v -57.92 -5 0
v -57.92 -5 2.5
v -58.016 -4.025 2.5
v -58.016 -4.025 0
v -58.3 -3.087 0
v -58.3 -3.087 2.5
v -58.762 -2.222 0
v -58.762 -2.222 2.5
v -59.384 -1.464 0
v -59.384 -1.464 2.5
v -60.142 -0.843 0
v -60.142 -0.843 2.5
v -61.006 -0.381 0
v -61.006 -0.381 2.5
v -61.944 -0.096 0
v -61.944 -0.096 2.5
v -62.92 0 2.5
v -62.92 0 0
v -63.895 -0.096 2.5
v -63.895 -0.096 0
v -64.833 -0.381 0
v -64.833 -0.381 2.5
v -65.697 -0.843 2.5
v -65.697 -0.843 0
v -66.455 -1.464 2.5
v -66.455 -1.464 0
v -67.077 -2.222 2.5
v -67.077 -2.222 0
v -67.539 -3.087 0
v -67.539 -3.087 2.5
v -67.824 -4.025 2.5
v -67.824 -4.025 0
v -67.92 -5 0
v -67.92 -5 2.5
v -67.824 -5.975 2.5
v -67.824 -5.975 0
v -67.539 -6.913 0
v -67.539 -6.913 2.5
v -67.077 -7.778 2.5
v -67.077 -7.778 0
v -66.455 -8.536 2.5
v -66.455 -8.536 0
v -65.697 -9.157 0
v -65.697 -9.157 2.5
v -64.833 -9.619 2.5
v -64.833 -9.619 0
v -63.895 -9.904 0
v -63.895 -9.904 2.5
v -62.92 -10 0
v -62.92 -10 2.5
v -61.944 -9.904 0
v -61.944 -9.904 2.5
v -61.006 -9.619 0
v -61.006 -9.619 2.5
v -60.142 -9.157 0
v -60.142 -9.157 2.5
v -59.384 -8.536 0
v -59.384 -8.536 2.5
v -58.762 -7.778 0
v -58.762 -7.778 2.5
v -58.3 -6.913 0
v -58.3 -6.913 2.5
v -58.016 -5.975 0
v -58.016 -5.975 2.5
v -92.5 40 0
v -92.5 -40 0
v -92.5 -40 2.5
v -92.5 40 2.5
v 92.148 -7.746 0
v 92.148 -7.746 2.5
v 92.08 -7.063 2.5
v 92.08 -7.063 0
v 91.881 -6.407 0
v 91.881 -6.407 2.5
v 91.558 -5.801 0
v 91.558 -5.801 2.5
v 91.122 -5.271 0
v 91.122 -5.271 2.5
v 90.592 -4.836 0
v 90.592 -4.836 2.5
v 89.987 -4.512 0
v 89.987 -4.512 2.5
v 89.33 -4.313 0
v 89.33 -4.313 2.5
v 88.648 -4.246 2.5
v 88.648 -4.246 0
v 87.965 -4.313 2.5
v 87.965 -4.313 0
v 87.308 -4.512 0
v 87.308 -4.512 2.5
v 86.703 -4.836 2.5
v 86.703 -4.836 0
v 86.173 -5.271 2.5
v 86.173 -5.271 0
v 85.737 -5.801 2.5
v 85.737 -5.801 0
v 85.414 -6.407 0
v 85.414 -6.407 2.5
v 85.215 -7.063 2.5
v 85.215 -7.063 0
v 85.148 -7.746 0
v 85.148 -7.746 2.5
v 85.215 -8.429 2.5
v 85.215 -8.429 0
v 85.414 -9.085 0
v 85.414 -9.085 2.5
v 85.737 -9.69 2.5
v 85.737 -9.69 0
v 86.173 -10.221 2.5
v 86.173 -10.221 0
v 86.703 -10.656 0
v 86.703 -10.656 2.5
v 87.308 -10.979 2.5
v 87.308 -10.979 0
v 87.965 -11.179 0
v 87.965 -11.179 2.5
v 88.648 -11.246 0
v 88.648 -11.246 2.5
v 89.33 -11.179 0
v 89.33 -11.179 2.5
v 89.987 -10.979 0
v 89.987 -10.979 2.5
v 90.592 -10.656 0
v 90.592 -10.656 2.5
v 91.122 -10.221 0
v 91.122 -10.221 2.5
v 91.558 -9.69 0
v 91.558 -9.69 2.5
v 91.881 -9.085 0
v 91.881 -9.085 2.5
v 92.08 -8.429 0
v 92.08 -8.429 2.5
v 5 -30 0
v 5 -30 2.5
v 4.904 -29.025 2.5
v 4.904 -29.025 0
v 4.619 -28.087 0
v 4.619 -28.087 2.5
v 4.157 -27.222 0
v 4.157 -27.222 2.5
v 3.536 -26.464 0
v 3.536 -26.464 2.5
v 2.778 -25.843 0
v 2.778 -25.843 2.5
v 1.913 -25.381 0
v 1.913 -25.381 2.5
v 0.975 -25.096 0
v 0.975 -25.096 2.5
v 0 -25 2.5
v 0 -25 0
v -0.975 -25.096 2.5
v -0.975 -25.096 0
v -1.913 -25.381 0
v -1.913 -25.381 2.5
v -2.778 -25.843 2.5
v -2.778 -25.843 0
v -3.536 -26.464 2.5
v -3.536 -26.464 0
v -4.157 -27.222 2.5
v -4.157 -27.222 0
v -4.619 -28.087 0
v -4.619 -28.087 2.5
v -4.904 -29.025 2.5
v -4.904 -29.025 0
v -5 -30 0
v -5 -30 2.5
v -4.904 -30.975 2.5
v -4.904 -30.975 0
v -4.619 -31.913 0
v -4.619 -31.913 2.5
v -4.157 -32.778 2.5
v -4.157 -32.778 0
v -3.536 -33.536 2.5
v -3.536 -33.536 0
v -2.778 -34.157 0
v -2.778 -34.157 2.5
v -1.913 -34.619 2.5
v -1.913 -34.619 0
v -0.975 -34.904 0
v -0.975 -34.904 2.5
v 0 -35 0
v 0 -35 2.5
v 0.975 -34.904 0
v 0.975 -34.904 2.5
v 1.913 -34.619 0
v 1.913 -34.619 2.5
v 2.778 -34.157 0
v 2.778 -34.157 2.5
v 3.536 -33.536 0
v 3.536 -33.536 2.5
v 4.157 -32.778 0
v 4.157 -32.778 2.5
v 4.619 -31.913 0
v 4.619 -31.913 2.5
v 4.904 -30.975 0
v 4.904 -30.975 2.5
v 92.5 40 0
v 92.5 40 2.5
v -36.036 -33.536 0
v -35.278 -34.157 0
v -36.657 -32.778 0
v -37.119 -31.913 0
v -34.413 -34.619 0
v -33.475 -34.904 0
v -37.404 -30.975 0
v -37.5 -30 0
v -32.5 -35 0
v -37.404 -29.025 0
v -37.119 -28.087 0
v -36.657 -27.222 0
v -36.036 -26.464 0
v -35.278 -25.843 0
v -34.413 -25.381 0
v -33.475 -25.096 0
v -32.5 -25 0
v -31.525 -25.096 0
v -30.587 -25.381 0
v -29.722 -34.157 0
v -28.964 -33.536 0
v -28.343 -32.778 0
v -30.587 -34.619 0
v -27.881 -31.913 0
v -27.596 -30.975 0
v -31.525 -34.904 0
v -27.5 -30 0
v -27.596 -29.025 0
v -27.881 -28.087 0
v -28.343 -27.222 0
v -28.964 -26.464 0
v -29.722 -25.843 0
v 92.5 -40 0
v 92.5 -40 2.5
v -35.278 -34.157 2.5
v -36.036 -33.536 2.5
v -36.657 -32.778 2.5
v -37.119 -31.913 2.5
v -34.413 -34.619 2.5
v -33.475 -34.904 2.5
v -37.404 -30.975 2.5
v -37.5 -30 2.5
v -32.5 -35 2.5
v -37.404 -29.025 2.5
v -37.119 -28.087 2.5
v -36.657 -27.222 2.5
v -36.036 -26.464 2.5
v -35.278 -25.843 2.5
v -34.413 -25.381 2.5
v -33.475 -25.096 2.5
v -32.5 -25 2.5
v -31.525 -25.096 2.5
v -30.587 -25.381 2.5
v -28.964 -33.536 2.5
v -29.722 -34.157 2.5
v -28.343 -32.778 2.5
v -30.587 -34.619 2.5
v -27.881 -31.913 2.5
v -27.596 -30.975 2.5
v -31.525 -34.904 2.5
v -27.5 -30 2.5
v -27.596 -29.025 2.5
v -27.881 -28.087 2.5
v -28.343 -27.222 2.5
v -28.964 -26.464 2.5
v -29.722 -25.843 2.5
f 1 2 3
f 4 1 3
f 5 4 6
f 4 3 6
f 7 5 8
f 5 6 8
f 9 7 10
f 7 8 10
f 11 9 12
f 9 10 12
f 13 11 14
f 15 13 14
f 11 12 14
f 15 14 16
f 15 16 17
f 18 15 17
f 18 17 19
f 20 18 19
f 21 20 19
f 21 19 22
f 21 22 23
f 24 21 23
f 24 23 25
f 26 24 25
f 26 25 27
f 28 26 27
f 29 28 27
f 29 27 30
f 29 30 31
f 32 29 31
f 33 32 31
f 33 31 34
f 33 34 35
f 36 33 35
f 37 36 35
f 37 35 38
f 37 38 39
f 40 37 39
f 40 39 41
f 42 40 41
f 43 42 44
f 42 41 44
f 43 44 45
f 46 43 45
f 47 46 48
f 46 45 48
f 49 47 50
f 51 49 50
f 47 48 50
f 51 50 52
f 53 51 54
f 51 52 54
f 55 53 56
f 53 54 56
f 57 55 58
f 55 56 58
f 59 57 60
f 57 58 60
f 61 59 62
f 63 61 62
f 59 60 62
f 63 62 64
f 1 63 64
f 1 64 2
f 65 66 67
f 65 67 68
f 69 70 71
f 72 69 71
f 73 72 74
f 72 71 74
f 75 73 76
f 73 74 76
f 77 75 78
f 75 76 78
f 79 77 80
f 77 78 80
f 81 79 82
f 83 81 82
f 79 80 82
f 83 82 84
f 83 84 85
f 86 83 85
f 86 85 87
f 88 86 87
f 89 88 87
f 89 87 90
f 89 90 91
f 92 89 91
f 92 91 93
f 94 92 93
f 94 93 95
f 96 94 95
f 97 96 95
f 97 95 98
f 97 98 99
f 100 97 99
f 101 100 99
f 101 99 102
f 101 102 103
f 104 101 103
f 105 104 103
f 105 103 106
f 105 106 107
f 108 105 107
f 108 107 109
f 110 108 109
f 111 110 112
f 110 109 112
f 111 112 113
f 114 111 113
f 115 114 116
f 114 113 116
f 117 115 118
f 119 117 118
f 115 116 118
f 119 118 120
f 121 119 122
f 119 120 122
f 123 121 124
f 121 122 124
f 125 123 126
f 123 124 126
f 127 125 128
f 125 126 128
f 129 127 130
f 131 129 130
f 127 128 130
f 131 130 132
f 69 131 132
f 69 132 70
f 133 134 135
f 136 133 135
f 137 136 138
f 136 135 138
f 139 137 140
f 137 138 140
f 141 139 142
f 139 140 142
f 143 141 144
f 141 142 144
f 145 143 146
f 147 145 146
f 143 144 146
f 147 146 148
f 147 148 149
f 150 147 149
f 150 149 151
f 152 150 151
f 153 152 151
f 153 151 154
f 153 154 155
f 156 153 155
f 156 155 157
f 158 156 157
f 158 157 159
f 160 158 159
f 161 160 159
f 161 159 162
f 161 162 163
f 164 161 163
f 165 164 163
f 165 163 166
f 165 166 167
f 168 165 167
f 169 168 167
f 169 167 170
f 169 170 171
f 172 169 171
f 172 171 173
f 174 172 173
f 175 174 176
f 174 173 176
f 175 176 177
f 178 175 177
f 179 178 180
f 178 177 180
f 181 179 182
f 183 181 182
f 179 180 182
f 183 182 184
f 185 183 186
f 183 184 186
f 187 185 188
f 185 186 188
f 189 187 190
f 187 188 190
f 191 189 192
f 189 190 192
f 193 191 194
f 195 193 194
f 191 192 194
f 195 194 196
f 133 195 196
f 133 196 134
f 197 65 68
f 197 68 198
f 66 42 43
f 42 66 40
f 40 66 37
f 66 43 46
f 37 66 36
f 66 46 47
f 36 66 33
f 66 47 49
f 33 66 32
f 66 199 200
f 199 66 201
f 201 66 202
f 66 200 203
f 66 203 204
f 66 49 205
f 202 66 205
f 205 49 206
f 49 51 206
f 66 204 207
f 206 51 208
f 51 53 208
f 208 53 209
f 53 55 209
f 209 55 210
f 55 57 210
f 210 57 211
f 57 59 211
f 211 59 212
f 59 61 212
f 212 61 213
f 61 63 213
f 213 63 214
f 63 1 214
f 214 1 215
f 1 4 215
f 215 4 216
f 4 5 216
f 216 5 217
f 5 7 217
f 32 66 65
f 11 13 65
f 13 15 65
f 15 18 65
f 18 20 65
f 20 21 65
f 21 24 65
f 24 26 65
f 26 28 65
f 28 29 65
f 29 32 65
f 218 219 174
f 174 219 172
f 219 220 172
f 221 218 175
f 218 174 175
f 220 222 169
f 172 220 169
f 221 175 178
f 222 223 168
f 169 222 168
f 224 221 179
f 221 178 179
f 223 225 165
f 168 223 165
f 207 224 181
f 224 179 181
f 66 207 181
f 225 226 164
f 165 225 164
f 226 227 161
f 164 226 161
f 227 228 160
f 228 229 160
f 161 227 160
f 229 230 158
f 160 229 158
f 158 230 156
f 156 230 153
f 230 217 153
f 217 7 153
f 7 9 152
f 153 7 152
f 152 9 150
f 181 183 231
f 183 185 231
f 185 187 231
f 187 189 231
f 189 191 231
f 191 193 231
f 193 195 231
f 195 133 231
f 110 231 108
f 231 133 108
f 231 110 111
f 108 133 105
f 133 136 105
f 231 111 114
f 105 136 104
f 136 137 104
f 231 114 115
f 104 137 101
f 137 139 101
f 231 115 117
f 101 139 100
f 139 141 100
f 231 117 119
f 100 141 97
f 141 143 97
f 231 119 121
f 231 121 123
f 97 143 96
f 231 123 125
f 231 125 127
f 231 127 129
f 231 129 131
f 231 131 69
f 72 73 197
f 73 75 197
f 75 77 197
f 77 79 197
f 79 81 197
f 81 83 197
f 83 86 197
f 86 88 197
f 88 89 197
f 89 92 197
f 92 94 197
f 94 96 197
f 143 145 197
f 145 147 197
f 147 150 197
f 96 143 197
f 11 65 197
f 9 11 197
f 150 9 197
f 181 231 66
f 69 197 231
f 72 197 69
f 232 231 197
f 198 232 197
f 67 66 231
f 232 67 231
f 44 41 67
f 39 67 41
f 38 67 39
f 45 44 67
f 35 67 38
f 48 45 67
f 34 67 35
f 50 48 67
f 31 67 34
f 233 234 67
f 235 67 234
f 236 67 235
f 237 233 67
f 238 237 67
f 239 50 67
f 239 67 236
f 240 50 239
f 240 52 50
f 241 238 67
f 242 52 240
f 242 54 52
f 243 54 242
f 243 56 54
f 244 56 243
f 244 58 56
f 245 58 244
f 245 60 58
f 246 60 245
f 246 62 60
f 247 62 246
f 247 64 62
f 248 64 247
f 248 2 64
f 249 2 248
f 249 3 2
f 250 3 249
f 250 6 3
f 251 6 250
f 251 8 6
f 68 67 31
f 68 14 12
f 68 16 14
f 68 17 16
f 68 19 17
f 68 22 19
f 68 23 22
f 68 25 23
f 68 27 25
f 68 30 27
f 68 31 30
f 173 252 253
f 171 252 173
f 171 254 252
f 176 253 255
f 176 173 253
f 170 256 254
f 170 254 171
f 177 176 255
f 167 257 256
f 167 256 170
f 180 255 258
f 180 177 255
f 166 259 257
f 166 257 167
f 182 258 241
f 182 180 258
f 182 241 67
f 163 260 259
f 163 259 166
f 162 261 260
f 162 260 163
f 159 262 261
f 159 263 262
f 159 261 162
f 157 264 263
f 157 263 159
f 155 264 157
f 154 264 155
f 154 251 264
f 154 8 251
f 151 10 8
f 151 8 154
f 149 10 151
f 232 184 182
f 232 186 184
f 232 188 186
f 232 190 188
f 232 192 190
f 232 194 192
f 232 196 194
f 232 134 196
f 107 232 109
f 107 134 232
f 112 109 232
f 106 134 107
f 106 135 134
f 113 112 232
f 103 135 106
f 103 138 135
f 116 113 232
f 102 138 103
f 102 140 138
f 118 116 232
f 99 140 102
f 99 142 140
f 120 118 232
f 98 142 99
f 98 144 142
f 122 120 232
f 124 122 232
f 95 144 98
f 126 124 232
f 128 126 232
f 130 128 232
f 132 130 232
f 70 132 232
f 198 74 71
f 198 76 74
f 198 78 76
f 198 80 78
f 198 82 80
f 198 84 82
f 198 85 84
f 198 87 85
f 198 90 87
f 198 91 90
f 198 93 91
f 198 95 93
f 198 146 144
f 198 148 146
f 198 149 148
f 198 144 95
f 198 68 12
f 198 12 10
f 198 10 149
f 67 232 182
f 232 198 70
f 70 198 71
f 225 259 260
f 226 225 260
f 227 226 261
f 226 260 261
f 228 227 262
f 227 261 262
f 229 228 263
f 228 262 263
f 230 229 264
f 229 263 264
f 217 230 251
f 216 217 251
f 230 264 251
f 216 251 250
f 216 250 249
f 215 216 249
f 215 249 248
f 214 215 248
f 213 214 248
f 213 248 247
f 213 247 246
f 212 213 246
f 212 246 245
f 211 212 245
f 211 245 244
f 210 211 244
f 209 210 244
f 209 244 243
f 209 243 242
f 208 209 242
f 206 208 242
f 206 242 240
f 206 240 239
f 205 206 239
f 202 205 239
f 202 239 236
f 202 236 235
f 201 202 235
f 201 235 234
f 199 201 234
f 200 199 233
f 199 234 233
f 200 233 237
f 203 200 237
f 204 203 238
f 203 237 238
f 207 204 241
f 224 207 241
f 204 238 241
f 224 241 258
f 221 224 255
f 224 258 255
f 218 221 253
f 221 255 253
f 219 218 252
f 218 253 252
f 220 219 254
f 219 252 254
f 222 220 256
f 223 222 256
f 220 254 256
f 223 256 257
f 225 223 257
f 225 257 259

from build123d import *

# Parameters (mm, degrees)
F0_W     = 185
F0_H     = 80
F1_DEPTH = 2.5
F2_R     = 5
F3_DEPTH = 25
F4_R     = 3.5
F5_DEPTH = 25


with BuildPart() as f1:
    # F0 (on Top) → F1 (new body)
    with BuildSketch(Plane.XY):
        Rectangle(F0_W, F0_H)
    extrude(amount=F1_DEPTH)

    # F2 (on face) → F3 (cut)
    with BuildSketch(Plane.XY.offset(2.5)):
        with Locations((-32.5, -30)):
            Circle(F2_R)
        with Locations((0, -30)):
            Circle(F2_R)
        with Locations((-62.919601, -5)):
            Circle(F2_R)
    extrude(amount=-F3_DEPTH, mode=Mode.SUBTRACT)

    # F4 (on face) → F5 (cut)
    with BuildSketch(Plane.XY.offset(2.5)):
        with Locations((88.647544, -7.745902)):
            Circle(F4_R)
    extrude(amount=-F5_DEPTH, mode=Mode.SUBTRACT)


solid = f1.part
